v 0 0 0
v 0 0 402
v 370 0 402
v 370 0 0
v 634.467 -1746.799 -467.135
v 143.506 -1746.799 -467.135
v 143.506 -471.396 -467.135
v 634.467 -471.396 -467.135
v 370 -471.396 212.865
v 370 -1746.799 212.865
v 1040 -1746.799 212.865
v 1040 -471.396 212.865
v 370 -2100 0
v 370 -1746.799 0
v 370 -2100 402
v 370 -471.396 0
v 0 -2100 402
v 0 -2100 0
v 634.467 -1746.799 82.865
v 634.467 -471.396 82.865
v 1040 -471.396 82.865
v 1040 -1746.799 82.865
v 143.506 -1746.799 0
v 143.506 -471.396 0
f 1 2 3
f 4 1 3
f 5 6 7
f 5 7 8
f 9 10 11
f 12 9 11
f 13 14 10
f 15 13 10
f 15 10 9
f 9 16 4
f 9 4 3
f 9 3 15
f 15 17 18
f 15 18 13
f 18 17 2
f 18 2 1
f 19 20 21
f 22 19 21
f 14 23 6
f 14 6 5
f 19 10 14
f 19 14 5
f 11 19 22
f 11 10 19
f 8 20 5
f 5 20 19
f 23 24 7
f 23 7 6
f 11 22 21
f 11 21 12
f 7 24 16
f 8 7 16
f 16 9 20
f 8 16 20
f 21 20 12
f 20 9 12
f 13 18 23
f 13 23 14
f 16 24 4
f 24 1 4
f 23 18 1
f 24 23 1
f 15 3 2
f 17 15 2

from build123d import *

# Parameters (mm, degrees)
F0_W     = 670
F0_H     = 130
F1_DEPTH = 2100
F2_W     = 490.9612983465
F2_H     = 1275.4036784172
F3_DEPTH = 550
F4_W     = 670
F4_H     = 471.3955521584
F4_H_2   = 353.2007694244
F5_DEPTH = 500


with BuildPart() as f1:
    # F0 (on Front) → F1 (new body)
    with BuildSketch(Plane.XZ):
        Polygon((0, 402), (0, 0), (370, 0), (370, 82.8653350472), (370, 212.8653350472), (370, 402), align=None)
        with Locations((705, 147.8653350472)):
            Rectangle(F0_W, F0_H)
    extrude(amount=F1_DEPTH)

    # F2 (on face) → F3 (join)
    with BuildSketch(Plane(origin=(0, 0, 82.8653350472), x_dir=(1, 0, 0), z_dir=(0, 0, -1))):
        with Locations((388.9861777425, 1109.097391367)):
            Rectangle(F2_W, F2_H)
    extrude(amount=F3_DEPTH)

    # F4 (on face) → F5 (cut)
    with BuildSketch(Plane(origin=(0, 0, 82.8653350472), x_dir=(1, 0, 0), z_dir=(0, 0, -1))):
        with Locations((705, 235.6977760792)):
            Rectangle(F4_W, F4_H)
        with Locations((705, 1923.3996152878)):
            Rectangle(F4_W, F4_H_2)
    extrude(amount=-F5_DEPTH, mode=Mode.SUBTRACT)


solid = f1.part
